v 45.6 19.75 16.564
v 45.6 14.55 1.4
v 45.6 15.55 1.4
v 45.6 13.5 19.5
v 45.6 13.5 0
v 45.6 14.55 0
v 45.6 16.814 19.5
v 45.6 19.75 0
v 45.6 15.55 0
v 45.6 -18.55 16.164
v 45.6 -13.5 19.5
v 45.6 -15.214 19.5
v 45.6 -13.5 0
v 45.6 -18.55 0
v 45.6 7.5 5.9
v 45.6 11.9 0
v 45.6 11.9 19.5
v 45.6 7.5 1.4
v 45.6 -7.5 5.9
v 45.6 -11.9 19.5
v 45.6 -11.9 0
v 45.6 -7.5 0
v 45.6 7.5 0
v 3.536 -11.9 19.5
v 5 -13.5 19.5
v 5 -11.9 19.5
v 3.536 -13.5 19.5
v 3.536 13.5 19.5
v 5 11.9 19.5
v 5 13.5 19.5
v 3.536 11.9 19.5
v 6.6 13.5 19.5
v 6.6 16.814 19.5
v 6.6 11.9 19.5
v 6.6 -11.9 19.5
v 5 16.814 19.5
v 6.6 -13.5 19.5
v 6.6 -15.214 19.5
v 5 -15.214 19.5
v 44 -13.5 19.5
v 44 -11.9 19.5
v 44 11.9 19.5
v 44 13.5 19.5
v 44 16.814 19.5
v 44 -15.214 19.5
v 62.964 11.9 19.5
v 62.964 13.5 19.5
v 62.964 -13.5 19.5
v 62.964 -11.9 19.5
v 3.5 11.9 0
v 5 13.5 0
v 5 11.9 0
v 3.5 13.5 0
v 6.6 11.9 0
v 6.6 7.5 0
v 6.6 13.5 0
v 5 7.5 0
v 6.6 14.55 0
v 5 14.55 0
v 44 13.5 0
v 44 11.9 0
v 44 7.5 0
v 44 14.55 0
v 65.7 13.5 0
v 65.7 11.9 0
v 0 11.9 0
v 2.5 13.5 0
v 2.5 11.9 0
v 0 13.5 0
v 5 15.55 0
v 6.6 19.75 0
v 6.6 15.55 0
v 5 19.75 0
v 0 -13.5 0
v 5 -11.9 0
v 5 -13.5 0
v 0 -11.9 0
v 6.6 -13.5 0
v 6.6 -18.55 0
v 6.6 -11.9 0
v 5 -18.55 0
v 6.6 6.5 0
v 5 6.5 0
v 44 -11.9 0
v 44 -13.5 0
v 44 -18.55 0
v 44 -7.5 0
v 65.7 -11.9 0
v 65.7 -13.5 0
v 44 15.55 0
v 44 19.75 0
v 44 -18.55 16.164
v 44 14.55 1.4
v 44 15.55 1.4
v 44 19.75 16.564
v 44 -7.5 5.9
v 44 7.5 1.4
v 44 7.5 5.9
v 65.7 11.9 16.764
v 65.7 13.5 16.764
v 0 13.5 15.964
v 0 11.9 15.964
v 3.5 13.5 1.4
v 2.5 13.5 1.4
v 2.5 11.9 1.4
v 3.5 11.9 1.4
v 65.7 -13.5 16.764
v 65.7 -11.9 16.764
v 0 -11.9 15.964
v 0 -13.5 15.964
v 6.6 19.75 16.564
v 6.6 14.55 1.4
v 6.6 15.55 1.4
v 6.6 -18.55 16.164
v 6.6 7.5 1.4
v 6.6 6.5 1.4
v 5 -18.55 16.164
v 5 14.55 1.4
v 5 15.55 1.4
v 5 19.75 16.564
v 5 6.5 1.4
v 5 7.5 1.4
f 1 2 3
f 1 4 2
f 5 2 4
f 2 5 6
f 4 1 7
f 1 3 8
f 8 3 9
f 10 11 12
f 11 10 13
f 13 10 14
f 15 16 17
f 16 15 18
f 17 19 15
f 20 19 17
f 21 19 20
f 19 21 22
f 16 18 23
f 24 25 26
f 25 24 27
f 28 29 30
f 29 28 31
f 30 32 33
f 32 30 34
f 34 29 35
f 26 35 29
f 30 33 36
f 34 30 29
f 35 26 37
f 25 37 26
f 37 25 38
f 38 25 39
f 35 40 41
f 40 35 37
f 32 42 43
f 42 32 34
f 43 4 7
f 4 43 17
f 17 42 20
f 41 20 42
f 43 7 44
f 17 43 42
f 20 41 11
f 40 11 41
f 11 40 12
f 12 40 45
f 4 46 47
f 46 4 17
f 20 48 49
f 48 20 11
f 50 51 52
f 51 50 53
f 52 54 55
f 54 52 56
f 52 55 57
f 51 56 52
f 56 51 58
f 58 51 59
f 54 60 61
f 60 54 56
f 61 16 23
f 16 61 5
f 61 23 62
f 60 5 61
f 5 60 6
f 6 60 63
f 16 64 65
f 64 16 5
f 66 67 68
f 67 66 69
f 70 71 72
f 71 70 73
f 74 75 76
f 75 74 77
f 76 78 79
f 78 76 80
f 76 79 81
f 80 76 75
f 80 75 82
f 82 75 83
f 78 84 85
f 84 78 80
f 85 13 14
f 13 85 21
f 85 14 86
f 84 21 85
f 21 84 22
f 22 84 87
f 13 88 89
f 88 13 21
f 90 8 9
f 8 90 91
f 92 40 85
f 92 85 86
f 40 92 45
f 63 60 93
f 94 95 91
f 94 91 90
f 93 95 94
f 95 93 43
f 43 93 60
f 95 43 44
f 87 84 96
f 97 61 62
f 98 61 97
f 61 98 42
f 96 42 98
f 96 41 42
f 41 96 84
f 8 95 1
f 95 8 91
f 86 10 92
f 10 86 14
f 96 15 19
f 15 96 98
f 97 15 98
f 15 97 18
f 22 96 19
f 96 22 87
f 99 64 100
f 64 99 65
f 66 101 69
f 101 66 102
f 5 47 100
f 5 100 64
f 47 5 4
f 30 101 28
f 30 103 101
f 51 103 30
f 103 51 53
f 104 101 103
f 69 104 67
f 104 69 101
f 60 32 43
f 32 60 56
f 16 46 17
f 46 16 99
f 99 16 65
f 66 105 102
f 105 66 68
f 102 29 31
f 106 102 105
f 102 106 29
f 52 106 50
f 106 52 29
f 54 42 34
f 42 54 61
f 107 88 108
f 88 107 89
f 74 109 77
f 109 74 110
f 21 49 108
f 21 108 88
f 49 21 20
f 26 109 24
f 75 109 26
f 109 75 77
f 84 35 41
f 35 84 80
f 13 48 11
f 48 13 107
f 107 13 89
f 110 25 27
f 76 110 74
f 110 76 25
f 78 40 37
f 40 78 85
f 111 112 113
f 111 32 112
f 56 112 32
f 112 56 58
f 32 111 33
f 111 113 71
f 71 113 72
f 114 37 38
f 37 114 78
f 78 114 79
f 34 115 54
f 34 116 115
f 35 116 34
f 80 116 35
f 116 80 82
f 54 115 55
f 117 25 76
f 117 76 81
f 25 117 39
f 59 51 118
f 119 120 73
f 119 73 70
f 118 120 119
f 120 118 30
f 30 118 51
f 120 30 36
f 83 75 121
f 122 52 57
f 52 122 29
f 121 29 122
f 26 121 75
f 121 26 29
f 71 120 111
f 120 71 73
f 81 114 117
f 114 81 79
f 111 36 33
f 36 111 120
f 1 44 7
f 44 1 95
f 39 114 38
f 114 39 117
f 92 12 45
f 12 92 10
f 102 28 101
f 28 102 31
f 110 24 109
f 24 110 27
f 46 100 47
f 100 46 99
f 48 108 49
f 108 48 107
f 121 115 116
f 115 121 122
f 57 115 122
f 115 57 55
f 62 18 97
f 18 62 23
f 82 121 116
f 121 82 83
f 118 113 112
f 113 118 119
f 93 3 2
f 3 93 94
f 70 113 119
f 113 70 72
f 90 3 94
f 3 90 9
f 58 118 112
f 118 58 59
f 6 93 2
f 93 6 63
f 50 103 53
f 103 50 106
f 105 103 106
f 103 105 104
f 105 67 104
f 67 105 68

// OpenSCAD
// file: ../parts/weather_shield.scad
echo(version=version());

// Values are in millimeters

$fa=1;
$fs=1;
////////////////////////////
function weather_shield_dims(has_lux=true) = [23, 34, has_lux?7:2.5];

module weather_shield(has_lux=true) {
	motenio = [23, 34, 2.5];
	cube(motenio);

	if(has_lux) {
		translate([0, 9, 4.5]) {
			cube([13, 10.2, 2.5]);
		}
		translate([13-2.5, 9, 2.5]) {
			cube([2.5, 10.2, 2.5]);
		}
	}
}

weather_shield();
// file: ../parts/moteino.scad
echo(version=version());

// Values are in millimeters

$fa=1;
$fs=1;
////////////////////////////

function moteino_dims(has_ftdi_pins=true, has_headers = "top") = [
	(23),
	(34 + (has_ftdi_pins?10:0)),
	(2.5 + ((has_headers)?10:0))
	];
	


module moteino(has_ftdi_pins=true, has_headers = "top") {
	motenio = [23, 34, 2.5];
	cube(motenio);

	if(has_ftdi_pins) {
		translate([4, -10, motenio[2]]) {
			cube([15, 12, 3]);
		}
	}
	header = [3, motenio[1], 10];
	if(has_headers == "top") {
		translate([0, 0, motenio[2]]) cube(header);
		translate([(motenio[0] - header[0]), 0, motenio[2]]) cube(header);
	} else if (has_headers == "bot" || has_headers == "bottom") {
		translate([0, 0, -header[2]]) cube(header);
		translate([(motenio[0] - header[0]), 0, -header[2]]) cube(header);
	}
}


moteino();

// vim: set ai sw=2 ts=2 :
// file: ../parts/switched-3AAA-box.scad
echo(version=version());
// Switched 3 AAA Battery Box
use <MCAD/boxes.scad>

function switched_AAA_dims() = [63.5, 37.1, 16];

module switched_AAA_box() {
	box=[16, 37.1, 63.5];
	rotate([0, 90, 0]) {
		translate(box/2) {
			roundedBox(box, 1, true);
		}
	}
	translate([55.7, 9.5, 0]) {
		cube(size=[3, 3, 1.5]);
	}
	translate([63.5, 31.3, -7]) {
		cube(size=[1, 2, 4]);
	}
}

module switched_AAA_box_clip(width=10, thickness=2) {
	difference() {
		cube([width, 37.1 + thickness*2, 16+thickness]);
		translate([-1, thickness, 16]) {
			switched_AAA_box();
		}
	}
}

switched_AAA_box();
// switched_AAA_box_clip();
// main file
//
// Batter case
// Moteino
// weathershield
//
$fs=0.5;

use <MCAD/boxes.scad>
use <../parts/switched-3AAA-box.scad>;
use <../parts/moteino.scad>;
use <../parts/weather_shield.scad>;

extruder_width = 0.4;
wall_thickness = 2*extruder_width;


wd = weather_shield_dims();
m = moteino_dims();
sab = switched_AAA_dims();

module parts_inside() {

	translate([sab[1]/2 - m[0]/2, 0, 0]) {
		translate([0, 0, m[2]]) {
			weather_shield();
		}
		// rotate([180,0,270])
		moteino();
	}

	translate([sab[1], sab[0] - m[0], -sab[2]]) {
		rotate([180, 0, 270]) {
			switched_AAA_box();
		}
	}
}


// translate([8.5, -18.5, -0.5]) {
// 	rotate([0, 0, 90]) {
// 		%parts_inside();
// 	}
// }

inside = sab + [0, 0, m[2] + wd[2]] + [3, 2, 3];

// full box size
wall_set = [for(i=[0:3]) wall_thickness*2];
outside = inside + wall_set;

module base_case() {
  difference() {
    roundedBox(outside, 4, false );
    roundedBox(inside, 4, false );
  }
}

module case_bot() {
  // lip_edge = 9; // little more than battery
  difference() {
    base_case();
    lift = outside[2] * 0.85;
    translate([0, 0, lift]) cube(outside+[1,1,0], center=true);
  }
  // difference() {
  //   roundedBox(inside, 4, true);
  //   roundedBox(inside - wall_set + [0,0,4], 4, true);
  //   translate([0,0, -inside[2] + 0.2]) cube(outside, center=true);
  //   translate([0,0, lip_edge]) cube(outside, center=true);
  // }
}

module case_top() {
  difference() {
    base_case();
    lift = outside[2] * (1 - 0.85);
    translate([0, 0, -lift]) cube(outside+[1,1,0], center=true);
  }

  lip_edge = 5;
  translate([0,0, (inside[2]/2) - lip_edge ]) {
    lipped = [inside[0], inside[1], lip_edge];
    difference() {
      roundedBox(lipped, 4, true);
      roundedBox(lipped - wall_set + [0,0,4], 4, true);

      translate([-sab[0]/2, -sab[1]/2, 2]) {
        rotate([0, 0, 0]) {
          switched_AAA_box();
        }
      }
    }
  }
}

module spacer() {
  // spacer around the moteino to hold the battery case up
  h=m[2]+wd[2];
  gap = 5;
  difference() {
    union() {
      translate([0, extruder_width + m[0]/2, 0]) {
        cube([inside[0]-wall_thickness, wall_thickness*2, h]);
      }
      translate([0, -extruder_width - (wall_thickness*2) - (m[0]/2), 0]) {
        cube([inside[0]-wall_thickness, wall_thickness*2, h]);
      }

      translate([gap, -sab[1]/2, 0]) {
        cube([wall_thickness*2, inside[1]-wall_thickness, h]);
      }
      translate([m[1], -sab[1]/2, 0]) {
        difference() {
          cube([wall_thickness*2, inside[1]-wall_thickness, h]);
          translate([-1, inside[1]/2 - 8.5, -0.1]) cube([15, 15, 6]);
        }
      }

      // small lifts for between the sheild and light sensor?
    }

    // “Slopes” for rounded bottom.
    c = sqrt(pow(gap,2) + pow(gap,2) - 2*gap*gap*cos(90));
    translate([-0.5, inside[1]/2 + wall_thickness, h - c/2]) {
      rotate([45, 0, 0]) {
        cube([inside[0], gap, gap]);
      }
    }
    translate([-0.5, -inside[1]/2 + wall_thickness, h - c/2]) {
      rotate([45, 0, 0]) {
        cube([inside[0], gap, gap]);
      }
    }
    translate([-c/2, -inside[1]/2 + wall_thickness, h]) {
      rotate([0, 45, 0]) {
        cube([gap, inside[1], gap]);
      }
    }
    translate([inside[0]-c/2, -inside[1]/2 + wall_thickness, h]) {
      rotate([0, 45, 0]) {
        cube([gap, inside[1], gap]);
      }
    }

    // Wire guides for antenna
    translate([0, 6.5, -0.1]) {
      cube([inside[0], 1, 1.5]);
    }
    translate([0, inside[1]/2 - gap, -0.1]) {
      cube([inside[0], 1, 1.5]);
    }
    translate([gap/2, 11.5, -0.1]) {
      cube([1, wall_thickness*2+1, 1.5]);
    }
  }
}

// case_bot();
// case_top();
// translate([-inside[0]/2, 0, 0]) {
  spacer();
// }
